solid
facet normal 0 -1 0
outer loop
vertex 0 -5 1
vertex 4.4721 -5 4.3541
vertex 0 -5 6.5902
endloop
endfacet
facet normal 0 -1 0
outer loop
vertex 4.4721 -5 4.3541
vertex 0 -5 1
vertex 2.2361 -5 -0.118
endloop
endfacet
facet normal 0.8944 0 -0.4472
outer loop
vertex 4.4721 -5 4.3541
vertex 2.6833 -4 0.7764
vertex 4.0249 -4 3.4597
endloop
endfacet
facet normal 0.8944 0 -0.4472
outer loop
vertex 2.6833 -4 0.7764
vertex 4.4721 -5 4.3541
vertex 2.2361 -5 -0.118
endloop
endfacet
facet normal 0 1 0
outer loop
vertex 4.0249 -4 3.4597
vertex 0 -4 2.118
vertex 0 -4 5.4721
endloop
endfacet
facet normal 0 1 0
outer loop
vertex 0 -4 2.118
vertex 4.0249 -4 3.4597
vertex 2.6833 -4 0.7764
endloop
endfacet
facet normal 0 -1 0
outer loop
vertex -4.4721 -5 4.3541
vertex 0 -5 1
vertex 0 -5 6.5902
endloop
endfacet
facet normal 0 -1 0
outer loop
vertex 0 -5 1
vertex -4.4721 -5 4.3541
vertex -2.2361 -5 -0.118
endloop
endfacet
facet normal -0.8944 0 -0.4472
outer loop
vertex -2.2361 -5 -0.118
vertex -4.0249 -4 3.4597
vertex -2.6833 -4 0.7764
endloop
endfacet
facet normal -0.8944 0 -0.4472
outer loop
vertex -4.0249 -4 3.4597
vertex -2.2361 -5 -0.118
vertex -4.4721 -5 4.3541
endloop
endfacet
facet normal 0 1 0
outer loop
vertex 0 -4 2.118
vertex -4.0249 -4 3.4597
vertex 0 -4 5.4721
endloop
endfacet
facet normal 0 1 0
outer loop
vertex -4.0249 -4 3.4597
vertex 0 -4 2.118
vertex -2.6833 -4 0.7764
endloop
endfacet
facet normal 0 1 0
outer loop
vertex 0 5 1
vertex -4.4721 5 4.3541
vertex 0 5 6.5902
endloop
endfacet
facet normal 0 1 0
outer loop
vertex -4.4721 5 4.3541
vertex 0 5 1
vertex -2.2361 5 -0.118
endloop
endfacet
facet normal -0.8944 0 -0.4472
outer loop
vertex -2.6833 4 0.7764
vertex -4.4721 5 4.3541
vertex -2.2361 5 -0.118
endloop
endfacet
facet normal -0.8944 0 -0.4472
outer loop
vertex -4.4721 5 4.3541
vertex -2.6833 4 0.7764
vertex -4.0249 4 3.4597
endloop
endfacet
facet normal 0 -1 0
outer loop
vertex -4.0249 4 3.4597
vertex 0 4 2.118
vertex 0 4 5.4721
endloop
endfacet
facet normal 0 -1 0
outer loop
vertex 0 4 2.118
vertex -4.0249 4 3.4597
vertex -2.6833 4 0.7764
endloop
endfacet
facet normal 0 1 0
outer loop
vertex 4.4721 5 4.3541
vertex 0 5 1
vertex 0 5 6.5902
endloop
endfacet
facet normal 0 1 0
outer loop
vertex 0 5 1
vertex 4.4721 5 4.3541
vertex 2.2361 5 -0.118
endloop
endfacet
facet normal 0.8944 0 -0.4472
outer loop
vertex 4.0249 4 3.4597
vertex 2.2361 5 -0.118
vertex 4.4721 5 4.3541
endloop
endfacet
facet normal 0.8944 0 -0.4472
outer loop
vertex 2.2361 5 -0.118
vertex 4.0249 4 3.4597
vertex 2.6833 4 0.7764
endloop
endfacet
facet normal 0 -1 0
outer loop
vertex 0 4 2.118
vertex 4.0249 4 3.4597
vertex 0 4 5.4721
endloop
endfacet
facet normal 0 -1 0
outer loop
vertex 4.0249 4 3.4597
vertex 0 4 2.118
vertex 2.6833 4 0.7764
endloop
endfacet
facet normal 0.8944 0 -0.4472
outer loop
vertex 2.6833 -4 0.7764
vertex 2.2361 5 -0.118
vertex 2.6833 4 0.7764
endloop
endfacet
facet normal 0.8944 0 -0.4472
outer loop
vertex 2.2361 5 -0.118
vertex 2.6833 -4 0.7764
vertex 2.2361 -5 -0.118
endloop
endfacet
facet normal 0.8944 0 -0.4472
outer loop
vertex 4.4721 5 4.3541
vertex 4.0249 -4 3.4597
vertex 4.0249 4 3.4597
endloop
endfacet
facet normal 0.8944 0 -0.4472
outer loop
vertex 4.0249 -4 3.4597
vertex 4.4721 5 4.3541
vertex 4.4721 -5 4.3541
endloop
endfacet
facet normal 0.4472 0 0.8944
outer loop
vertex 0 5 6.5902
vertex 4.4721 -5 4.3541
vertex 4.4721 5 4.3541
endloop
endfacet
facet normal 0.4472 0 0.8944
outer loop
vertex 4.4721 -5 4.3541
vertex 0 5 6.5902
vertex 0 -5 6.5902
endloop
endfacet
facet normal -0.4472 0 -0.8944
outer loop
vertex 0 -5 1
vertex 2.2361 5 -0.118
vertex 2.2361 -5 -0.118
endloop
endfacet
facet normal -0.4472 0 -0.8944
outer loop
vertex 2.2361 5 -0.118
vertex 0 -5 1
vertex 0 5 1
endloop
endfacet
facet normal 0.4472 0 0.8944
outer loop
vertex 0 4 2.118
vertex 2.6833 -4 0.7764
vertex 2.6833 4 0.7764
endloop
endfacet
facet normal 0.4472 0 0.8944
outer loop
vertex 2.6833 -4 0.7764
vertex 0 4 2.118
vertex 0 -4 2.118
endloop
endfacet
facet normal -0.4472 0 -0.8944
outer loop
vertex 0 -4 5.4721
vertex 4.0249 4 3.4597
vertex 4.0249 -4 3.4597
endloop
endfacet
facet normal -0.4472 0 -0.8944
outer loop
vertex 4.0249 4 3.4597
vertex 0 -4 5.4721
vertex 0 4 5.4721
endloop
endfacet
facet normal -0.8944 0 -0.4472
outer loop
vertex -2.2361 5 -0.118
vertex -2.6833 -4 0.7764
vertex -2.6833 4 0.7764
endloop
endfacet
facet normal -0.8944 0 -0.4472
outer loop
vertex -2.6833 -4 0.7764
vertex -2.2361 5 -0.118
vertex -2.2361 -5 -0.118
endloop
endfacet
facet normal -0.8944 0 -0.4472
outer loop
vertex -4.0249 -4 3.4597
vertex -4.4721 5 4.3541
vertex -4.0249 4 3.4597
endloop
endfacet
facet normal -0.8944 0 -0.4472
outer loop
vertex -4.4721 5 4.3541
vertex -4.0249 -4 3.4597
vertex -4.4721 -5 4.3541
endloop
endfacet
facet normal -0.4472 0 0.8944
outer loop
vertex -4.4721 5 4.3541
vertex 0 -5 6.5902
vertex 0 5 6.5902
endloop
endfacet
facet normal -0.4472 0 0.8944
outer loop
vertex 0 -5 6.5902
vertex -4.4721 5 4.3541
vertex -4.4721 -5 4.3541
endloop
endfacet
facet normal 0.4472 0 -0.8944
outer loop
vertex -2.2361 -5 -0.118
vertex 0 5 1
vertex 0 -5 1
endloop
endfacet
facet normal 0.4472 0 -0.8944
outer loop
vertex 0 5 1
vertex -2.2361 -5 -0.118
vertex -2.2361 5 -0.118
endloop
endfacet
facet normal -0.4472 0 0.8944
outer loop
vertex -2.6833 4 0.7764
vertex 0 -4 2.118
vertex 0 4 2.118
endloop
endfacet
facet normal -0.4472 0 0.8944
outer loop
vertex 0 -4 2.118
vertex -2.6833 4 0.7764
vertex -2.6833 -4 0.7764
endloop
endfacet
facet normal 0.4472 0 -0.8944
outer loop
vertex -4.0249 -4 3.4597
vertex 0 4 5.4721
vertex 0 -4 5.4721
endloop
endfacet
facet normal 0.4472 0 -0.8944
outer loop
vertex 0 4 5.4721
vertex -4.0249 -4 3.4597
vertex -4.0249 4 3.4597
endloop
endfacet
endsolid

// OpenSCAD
// file: s/u7041s01.scad
use <../../lib.scad>
function ldraw_lib__s__u7041s01() = [
// 0 ~Modulex Angled Brick 27 2 x 1 Double - Side
// 0 Name: s\u7041s01.dat
// 0 Author: Magnus Forsberg [MagFors]
// 0 !LDRAW_ORG Subpart UPDATE 2025-09
// 0 !LICENSE Licensed under CC BY 4.0 : see CAreadme.txt
// 
// 0 BFC CERTIFY CCW
  [0,"BFC","CERTIFY"],
  [0,"BFC","CCW"],
// 
// 0 !HISTORY 2025-09-29 [OrionP] Official Update 2025-09
// 
// 4 16 0 -16.4754 0 0 -2.499932 0 5.590156 .295115 0 11.180335 -10.885221 0
  [4,16,0,-16.4754,0,0,-2.499932,0,5.590156,.295115,0,11.180335,-10.885221,0],
// 4 16 5.590156 .295115 0 6.708192 -1.940952 2.5 10.062299 -8.649154 2.5 11.180335 -10.885221 0
  [4,16,5.590156,.295115,0,6.708192,-1.940952,2.5,10.062299,-8.649154,2.5,11.180335,-10.885221,0],
// 4 16 0 -5.295055 2.5 0 -13.680314 2.5 10.062299 -8.649154 2.5 6.708192 -1.940952 2.5
  [4,16,0,-5.295055,2.5,0,-13.680314,2.5,10.062299,-8.649154,2.5,6.708192,-1.940952,2.5],
// 2 24 6.708192 -1.940952 2.5 10.062299 -8.649154 2.5
  [2,24,6.708192,-1.940952,2.5,10.062299,-8.649154,2.5],
// 2 24 11.180335 -10.885221 0 5.590156 .295115 0
  [2,24,11.180335,-10.885221,0,5.590156,.295115,0],
// 2 24 5.590156 .295115 0 0 -2.499932 0
  [2,24,5.590156,.295115,0,0,-2.499932,0],
// 2 24 0 -5.295055 2.5 6.708192 -1.940952 2.5
  [2,24,0,-5.295055,2.5,6.708192,-1.940952,2.5],
// 2 24 0 -13.680314 2.5 10.062299 -8.649154 2.5
  [2,24,0,-13.680314,2.5,10.062299,-8.649154,2.5],
// 2 24 0 -16.4754 0 11.180335 -10.885221 0
  [2,24,0,-16.4754,0,11.180335,-10.885221,0],
// 4 16 -5.590156 .295115 0 0 -2.499932 0 0 -16.4754 0 -11.180335 -10.885221 0
  [4,16,-5.590156,.295115,0,0,-2.499932,0,0,-16.4754,0,-11.180335,-10.885221,0],
// 4 16 -10.062299 -8.649154 2.5 -6.708192 -1.940952 2.5 -5.590156 .295115 0 -11.180335 -10.885221 0
  [4,16,-10.062299,-8.649154,2.5,-6.708192,-1.940952,2.5,-5.590156,.295115,0,-11.180335,-10.885221,0],
// 4 16 -10.062299 -8.649154 2.5 0 -13.680314 2.5 0 -5.295055 2.5 -6.708192 -1.940952 2.5
  [4,16,-10.062299,-8.649154,2.5,0,-13.680314,2.5,0,-5.295055,2.5,-6.708192,-1.940952,2.5],
// 2 24 -10.062299 -8.649154 2.5 -6.708192 -1.940952 2.5
  [2,24,-10.062299,-8.649154,2.5,-6.708192,-1.940952,2.5],
// 2 24 -5.590156 .295115 0 -11.180335 -10.885221 0
  [2,24,-5.590156,.295115,0,-11.180335,-10.885221,0],
// 2 24 0 -2.499932 0 -5.590156 .295115 0
  [2,24,0,-2.499932,0,-5.590156,.295115,0],
// 2 24 -6.708192 -1.940952 2.5 0 -5.295055 2.5
  [2,24,-6.708192,-1.940952,2.5,0,-5.295055,2.5],
// 2 24 -10.062299 -8.649154 2.5 0 -13.680314 2.5
  [2,24,-10.062299,-8.649154,2.5,0,-13.680314,2.5],
// 2 24 -11.180335 -10.885221 0 0 -16.4754 0
  [2,24,-11.180335,-10.885221,0,0,-16.4754,0],
];
module ldraw_lib__s__u7041s01(step=0, col=false, unit=2/5, alt=false, line=0.2, solid=!$preview)
    makepoly(ldraw_lib__s__u7041s01(), step=step, col=col, unit=unit, alt=alt, line=line, solid=solid);
ldraw_lib__s__u7041s01(line=0.2);
// main file
use <../lib.scad>
use <s/u7041s01.scad>
function ldraw_lib__u7042() = [
// 0 Modulex Brick Angled 27 2 x 2 Double
// 0 Name: u7042.dat
// 0 Author: Magnus Forsberg [MagFors]
// 0 !LDRAW_ORG Part UPDATE 2025-09
// 0 !LICENSE Licensed under CC BY 4.0 : see CAreadme.txt
// 
// 0 !HELP 1 16 12.5 12.5 0 1 0 0 0 1 0 0 0 1 u7031.dat
// 0 !HELP 1 35 8.385 -5.295 0 0 .894 .447 0 .447 -.894 -1 0 0 u7001.dat
// 
// 0 BFC CERTIFY CCW
  [0,"BFC","CERTIFY"],
  [0,"BFC","CCW"],
// 
// 0 !KEYWORDS 26.5651 degree, Bricklink Mx2402B, Rebrickable 2402B, slope 1:2
// 
// 0 !HISTORY 2025-09-29 [OrionP] Official Update 2025-09
// 
// 1 16 0 0 -12.5 1 0 0 0 1 0 0 0 1 s\u7041s01.dat
  [1,16,0,0,-12.5,1,0,0,0,1,0,0,0,1, ldraw_lib__s__u7041s01()],
// 1 16 0 0 12.5 -1 0 0 0 1 0 0 0 -1 s\u7041s01.dat
  [1,16,0,0,12.5,-1,0,0,0,1,0,0,0,-1, ldraw_lib__s__u7041s01()],
// 
// 2 24 0 -2.499932 12.5 0 -2.499932 -12.5
  [2,24,0,-2.499932,12.5,0,-2.499932,-12.5],
// 2 24 0 -5.295055 10 0 -5.295055 -10
  [2,24,0,-5.295055,10,0,-5.295055,-10],
// 2 24 0 -13.680314 -10 0 -13.680314 10
  [2,24,0,-13.680314,-10,0,-13.680314,10],
// 2 24 0 -16.4754 -12.5 0 -16.4754 12.5
  [2,24,0,-16.4754,-12.5,0,-16.4754,12.5],
// 
// 4 16 5.590156 .295115 -12.5 5.590156 .295115 12.5 6.708192 -1.940952 10 6.708192 -1.940952 -10
  [4,16,5.590156,.295115,-12.5,5.590156,.295115,12.5,6.708192,-1.940952,10,6.708192,-1.940952,-10],
// 4 16 11.180335 -10.885221 -12.5 10.062299 -8.649154 -10 10.062299 -8.649154 10 11.180335 -10.885221 12.5
  [4,16,11.180335,-10.885221,-12.5,10.062299,-8.649154,-10,10.062299,-8.649154,10,11.180335,-10.885221,12.5],
// 4 16 11.180335 -10.885221 -12.5 11.180335 -10.885221 12.5 0 -16.4754 12.5 0 -16.4754 -12.5
  [4,16,11.180335,-10.885221,-12.5,11.180335,-10.885221,12.5,0,-16.4754,12.5,0,-16.4754,-12.5],
// 4 16 0 -2.499932 12.5 5.590156 .295115 12.5 5.590156 .295115 -12.5 0 -2.499932 -12.5
  [4,16,0,-2.499932,12.5,5.590156,.295115,12.5,5.590156,.295115,-12.5,0,-2.499932,-12.5],
// 4 16 0 -5.295055 10 0 -5.295055 -10 6.708192 -1.940952 -10 6.708192 -1.940952 10
  [4,16,0,-5.295055,10,0,-5.295055,-10,6.708192,-1.940952,-10,6.708192,-1.940952,10],
// 4 16 0 -13.680314 10 10.062299 -8.649154 10 10.062299 -8.649154 -10 0 -13.680314 -10
  [4,16,0,-13.680314,10,10.062299,-8.649154,10,10.062299,-8.649154,-10,0,-13.680314,-10],
// 2 24 11.180335 -10.885221 -12.5 11.180335 -10.885221 12.5
  [2,24,11.180335,-10.885221,-12.5,11.180335,-10.885221,12.5],
// 2 24 10.062299 -8.649154 -10 10.062299 -8.649154 10
  [2,24,10.062299,-8.649154,-10,10.062299,-8.649154,10],
// 2 24 5.590156 .295115 -12.5 5.590156 .295115 12.5
  [2,24,5.590156,.295115,-12.5,5.590156,.295115,12.5],
// 2 24 6.708192 -1.940952 10 6.708192 -1.940952 -10
  [2,24,6.708192,-1.940952,10,6.708192,-1.940952,-10],
// 
// 4 16 -6.708192 -1.940952 10 -5.590156 .295115 12.5 -5.590156 .295115 -12.5 -6.708192 -1.940952 -10
  [4,16,-6.708192,-1.940952,10,-5.590156,.295115,12.5,-5.590156,.295115,-12.5,-6.708192,-1.940952,-10],
// 4 16 -10.062299 -8.649154 10 -10.062299 -8.649154 -10 -11.180335 -10.885221 -12.5 -11.180335 -10.885221 12.5
  [4,16,-10.062299,-8.649154,10,-10.062299,-8.649154,-10,-11.180335,-10.885221,-12.5,-11.180335,-10.885221,12.5],
// 4 16 0 -16.4754 12.5 -11.180335 -10.885221 12.5 -11.180335 -10.885221 -12.5 0 -16.4754 -12.5
  [4,16,0,-16.4754,12.5,-11.180335,-10.885221,12.5,-11.180335,-10.885221,-12.5,0,-16.4754,-12.5],
// 4 16 -5.590156 .295115 -12.5 -5.590156 .295115 12.5 0 -2.499932 12.5 0 -2.499932 -12.5
  [4,16,-5.590156,.295115,-12.5,-5.590156,.295115,12.5,0,-2.499932,12.5,0,-2.499932,-12.5],
// 4 16 -6.708192 -1.940952 -10 0 -5.295055 -10 0 -5.295055 10 -6.708192 -1.940952 10
  [4,16,-6.708192,-1.940952,-10,0,-5.295055,-10,0,-5.295055,10,-6.708192,-1.940952,10],
// 4 16 -10.062299 -8.649154 -10 -10.062299 -8.649154 10 0 -13.680314 10 0 -13.680314 -10
  [4,16,-10.062299,-8.649154,-10,-10.062299,-8.649154,10,0,-13.680314,10,0,-13.680314,-10],
// 2 24 -11.180335 -10.885221 12.5 -11.180335 -10.885221 -12.5
  [2,24,-11.180335,-10.885221,12.5,-11.180335,-10.885221,-12.5],
// 2 24 -10.062299 -8.649154 10 -10.062299 -8.649154 -10
  [2,24,-10.062299,-8.649154,10,-10.062299,-8.649154,-10],
// 2 24 -5.590156 .295115 12.5 -5.590156 .295115 -12.5
  [2,24,-5.590156,.295115,12.5,-5.590156,.295115,-12.5],
// 2 24 -6.708192 -1.940952 -10 -6.708192 -1.940952 10
  [2,24,-6.708192,-1.940952,-10,-6.708192,-1.940952,10],
];
module ldraw_lib__u7042(step=0, col=false, unit=2/5, alt=false, line=0.2, solid=!$preview)
    makepoly(ldraw_lib__u7042(), step=step, col=col, unit=unit, alt=alt, line=line, solid=solid);
ldraw_lib__u7042(line=0.2);
